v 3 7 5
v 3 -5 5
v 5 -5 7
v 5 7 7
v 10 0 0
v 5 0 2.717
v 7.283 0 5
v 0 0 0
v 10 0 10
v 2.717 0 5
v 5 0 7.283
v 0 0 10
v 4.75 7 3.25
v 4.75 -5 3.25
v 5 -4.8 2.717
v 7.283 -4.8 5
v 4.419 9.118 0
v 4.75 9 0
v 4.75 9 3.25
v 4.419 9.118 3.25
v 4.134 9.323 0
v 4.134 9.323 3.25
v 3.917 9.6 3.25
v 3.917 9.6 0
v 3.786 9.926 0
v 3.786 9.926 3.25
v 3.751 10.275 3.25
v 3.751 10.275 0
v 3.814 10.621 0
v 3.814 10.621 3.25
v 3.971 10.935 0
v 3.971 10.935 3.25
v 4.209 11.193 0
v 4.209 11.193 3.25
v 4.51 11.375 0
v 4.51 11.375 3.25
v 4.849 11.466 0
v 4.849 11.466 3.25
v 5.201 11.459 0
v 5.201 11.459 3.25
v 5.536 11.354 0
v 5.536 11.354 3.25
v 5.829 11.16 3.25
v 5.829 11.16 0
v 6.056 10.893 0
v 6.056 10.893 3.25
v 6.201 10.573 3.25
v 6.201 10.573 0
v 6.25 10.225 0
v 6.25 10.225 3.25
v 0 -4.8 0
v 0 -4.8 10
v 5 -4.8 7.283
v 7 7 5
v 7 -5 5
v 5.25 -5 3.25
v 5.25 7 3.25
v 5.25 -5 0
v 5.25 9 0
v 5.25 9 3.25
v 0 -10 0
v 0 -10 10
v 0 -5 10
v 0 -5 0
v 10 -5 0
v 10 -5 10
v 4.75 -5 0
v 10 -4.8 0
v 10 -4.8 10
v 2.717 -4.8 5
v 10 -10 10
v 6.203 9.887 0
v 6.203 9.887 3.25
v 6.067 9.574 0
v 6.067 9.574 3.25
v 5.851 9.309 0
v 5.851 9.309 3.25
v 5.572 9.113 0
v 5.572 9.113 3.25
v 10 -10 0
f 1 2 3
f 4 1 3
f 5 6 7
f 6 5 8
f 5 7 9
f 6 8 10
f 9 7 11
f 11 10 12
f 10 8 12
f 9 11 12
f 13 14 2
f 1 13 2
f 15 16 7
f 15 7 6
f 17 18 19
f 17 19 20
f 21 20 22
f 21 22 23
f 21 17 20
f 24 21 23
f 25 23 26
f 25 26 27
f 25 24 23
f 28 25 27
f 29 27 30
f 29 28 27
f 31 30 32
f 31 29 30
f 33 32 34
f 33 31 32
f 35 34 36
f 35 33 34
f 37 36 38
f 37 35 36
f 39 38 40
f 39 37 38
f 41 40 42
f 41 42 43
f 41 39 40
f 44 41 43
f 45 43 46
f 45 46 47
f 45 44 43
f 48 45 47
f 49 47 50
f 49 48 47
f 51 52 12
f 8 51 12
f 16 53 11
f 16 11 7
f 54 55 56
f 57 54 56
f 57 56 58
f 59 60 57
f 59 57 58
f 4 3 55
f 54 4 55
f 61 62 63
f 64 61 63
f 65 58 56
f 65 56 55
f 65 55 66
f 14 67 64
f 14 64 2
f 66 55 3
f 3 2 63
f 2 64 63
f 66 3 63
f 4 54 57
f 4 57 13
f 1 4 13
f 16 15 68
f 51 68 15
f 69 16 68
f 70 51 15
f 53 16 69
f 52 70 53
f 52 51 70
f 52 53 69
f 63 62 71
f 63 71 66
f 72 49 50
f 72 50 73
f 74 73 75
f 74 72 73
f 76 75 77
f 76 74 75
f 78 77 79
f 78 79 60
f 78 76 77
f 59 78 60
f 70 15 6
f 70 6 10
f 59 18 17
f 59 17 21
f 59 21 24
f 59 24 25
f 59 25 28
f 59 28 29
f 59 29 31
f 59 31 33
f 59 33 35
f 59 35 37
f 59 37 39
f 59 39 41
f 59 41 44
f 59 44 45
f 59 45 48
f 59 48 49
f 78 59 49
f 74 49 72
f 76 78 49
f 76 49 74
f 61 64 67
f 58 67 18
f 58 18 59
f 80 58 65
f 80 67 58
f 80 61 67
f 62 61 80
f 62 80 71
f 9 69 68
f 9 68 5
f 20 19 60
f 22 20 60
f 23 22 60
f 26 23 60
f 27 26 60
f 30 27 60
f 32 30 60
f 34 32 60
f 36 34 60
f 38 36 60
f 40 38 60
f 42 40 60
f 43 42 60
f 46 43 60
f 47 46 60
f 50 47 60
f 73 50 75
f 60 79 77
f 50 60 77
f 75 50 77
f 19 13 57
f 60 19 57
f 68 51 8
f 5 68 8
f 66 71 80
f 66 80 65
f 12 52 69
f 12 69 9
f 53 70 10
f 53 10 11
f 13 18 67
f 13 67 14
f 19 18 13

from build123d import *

# Parameters (mm, degrees)
F0_W          = 5
F0_H          = 10
F1_DEPTH      = 10
F0_W_2        = 4.8
F2_DEPTH      = 10
F4_DEPTH      = 10
F5_DEPTH      = 12
F7_DEPTH      = 2
F7_DEPTH_BACK = 12
F9_DEPTH      = 3.25


with BuildPart() as f1:
    # F0 (on Right) → F1 (new body)
    with BuildSketch(Plane.YZ):
        with Locations((-7.5, 5)):
            Rectangle(F0_W, F0_H)
    extrude(amount=F1_DEPTH)

    # F3 (on face) → F5 (join)
    with BuildSketch(Plane(origin=(0, -5, 0), x_dir=(-1, 0, 0), z_dir=(0, 1, 0))):
        Polygon((-7, 5), (-5, 3), (-3, 5), (-5, 7), align=None)
    extrude(amount=F5_DEPTH)

    # F6 (on face) → F7 (join, two sides)
    with BuildSketch(Plane(origin=(0, 7, 0), x_dir=(-1, 0, 0), z_dir=(0, 1, 0))) as f7_sk:
        Polygon((-5, 3), (-5.25, 3.25), (-5.25, 0), (-4.75, 0), (-4.75, 3.25), align=None)
        Polygon((-4.75, 3.25), (-5.25, 3.25), (-5, 3), align=None)
    extrude(amount=F7_DEPTH)
    extrude(f7_sk.sketch, amount=-F7_DEPTH_BACK)

    # F8 (on face) → F9 (join, through all)
    with BuildSketch(Plane(origin=(0, 0, 0), x_dir=(1, 0, 0), z_dir=(0, 0, -1))):
        with BuildLine():
            ThreePointArc((4.75, -9), (4.209430585, -11.1929907079), (6.25, -10.2247448714))
            ThreePointArc((6.25, -10.2247448714), (5.9682458366, -9.4341754563), (5.25, -9))
            Line((5.25, -9), (4.75, -9))
        make_face()
    extrude(amount=-F9_DEPTH)


with BuildPart() as f2:
    # F0 (on Right) → F2 (new body)
    with BuildSketch(Plane.YZ):
        with Locations((-2.4, 5)):
            Rectangle(F0_W_2, F0_H)
    extrude(amount=F2_DEPTH)

    # F3 (on face) → F4 (cut)
    with BuildSketch(Plane(origin=(0, -5, 0), x_dir=(-1, 0, 0), z_dir=(0, 1, 0))):
        Polygon((-7.2828427125, 5), (-5, 2.7171572875), (-2.7171572875, 5), (-5, 7.2828427125), align=None)
        Polygon((-3, 5), (-5, 3), (-7, 5), (-5, 7), align=None, mode=Mode.SUBTRACT)
        Polygon((-7, 5), (-5, 3), (-3, 5), (-5, 7), align=None)
    extrude(amount=F4_DEPTH, mode=Mode.SUBTRACT)


solid = Compound([f1.part, f2.part])
